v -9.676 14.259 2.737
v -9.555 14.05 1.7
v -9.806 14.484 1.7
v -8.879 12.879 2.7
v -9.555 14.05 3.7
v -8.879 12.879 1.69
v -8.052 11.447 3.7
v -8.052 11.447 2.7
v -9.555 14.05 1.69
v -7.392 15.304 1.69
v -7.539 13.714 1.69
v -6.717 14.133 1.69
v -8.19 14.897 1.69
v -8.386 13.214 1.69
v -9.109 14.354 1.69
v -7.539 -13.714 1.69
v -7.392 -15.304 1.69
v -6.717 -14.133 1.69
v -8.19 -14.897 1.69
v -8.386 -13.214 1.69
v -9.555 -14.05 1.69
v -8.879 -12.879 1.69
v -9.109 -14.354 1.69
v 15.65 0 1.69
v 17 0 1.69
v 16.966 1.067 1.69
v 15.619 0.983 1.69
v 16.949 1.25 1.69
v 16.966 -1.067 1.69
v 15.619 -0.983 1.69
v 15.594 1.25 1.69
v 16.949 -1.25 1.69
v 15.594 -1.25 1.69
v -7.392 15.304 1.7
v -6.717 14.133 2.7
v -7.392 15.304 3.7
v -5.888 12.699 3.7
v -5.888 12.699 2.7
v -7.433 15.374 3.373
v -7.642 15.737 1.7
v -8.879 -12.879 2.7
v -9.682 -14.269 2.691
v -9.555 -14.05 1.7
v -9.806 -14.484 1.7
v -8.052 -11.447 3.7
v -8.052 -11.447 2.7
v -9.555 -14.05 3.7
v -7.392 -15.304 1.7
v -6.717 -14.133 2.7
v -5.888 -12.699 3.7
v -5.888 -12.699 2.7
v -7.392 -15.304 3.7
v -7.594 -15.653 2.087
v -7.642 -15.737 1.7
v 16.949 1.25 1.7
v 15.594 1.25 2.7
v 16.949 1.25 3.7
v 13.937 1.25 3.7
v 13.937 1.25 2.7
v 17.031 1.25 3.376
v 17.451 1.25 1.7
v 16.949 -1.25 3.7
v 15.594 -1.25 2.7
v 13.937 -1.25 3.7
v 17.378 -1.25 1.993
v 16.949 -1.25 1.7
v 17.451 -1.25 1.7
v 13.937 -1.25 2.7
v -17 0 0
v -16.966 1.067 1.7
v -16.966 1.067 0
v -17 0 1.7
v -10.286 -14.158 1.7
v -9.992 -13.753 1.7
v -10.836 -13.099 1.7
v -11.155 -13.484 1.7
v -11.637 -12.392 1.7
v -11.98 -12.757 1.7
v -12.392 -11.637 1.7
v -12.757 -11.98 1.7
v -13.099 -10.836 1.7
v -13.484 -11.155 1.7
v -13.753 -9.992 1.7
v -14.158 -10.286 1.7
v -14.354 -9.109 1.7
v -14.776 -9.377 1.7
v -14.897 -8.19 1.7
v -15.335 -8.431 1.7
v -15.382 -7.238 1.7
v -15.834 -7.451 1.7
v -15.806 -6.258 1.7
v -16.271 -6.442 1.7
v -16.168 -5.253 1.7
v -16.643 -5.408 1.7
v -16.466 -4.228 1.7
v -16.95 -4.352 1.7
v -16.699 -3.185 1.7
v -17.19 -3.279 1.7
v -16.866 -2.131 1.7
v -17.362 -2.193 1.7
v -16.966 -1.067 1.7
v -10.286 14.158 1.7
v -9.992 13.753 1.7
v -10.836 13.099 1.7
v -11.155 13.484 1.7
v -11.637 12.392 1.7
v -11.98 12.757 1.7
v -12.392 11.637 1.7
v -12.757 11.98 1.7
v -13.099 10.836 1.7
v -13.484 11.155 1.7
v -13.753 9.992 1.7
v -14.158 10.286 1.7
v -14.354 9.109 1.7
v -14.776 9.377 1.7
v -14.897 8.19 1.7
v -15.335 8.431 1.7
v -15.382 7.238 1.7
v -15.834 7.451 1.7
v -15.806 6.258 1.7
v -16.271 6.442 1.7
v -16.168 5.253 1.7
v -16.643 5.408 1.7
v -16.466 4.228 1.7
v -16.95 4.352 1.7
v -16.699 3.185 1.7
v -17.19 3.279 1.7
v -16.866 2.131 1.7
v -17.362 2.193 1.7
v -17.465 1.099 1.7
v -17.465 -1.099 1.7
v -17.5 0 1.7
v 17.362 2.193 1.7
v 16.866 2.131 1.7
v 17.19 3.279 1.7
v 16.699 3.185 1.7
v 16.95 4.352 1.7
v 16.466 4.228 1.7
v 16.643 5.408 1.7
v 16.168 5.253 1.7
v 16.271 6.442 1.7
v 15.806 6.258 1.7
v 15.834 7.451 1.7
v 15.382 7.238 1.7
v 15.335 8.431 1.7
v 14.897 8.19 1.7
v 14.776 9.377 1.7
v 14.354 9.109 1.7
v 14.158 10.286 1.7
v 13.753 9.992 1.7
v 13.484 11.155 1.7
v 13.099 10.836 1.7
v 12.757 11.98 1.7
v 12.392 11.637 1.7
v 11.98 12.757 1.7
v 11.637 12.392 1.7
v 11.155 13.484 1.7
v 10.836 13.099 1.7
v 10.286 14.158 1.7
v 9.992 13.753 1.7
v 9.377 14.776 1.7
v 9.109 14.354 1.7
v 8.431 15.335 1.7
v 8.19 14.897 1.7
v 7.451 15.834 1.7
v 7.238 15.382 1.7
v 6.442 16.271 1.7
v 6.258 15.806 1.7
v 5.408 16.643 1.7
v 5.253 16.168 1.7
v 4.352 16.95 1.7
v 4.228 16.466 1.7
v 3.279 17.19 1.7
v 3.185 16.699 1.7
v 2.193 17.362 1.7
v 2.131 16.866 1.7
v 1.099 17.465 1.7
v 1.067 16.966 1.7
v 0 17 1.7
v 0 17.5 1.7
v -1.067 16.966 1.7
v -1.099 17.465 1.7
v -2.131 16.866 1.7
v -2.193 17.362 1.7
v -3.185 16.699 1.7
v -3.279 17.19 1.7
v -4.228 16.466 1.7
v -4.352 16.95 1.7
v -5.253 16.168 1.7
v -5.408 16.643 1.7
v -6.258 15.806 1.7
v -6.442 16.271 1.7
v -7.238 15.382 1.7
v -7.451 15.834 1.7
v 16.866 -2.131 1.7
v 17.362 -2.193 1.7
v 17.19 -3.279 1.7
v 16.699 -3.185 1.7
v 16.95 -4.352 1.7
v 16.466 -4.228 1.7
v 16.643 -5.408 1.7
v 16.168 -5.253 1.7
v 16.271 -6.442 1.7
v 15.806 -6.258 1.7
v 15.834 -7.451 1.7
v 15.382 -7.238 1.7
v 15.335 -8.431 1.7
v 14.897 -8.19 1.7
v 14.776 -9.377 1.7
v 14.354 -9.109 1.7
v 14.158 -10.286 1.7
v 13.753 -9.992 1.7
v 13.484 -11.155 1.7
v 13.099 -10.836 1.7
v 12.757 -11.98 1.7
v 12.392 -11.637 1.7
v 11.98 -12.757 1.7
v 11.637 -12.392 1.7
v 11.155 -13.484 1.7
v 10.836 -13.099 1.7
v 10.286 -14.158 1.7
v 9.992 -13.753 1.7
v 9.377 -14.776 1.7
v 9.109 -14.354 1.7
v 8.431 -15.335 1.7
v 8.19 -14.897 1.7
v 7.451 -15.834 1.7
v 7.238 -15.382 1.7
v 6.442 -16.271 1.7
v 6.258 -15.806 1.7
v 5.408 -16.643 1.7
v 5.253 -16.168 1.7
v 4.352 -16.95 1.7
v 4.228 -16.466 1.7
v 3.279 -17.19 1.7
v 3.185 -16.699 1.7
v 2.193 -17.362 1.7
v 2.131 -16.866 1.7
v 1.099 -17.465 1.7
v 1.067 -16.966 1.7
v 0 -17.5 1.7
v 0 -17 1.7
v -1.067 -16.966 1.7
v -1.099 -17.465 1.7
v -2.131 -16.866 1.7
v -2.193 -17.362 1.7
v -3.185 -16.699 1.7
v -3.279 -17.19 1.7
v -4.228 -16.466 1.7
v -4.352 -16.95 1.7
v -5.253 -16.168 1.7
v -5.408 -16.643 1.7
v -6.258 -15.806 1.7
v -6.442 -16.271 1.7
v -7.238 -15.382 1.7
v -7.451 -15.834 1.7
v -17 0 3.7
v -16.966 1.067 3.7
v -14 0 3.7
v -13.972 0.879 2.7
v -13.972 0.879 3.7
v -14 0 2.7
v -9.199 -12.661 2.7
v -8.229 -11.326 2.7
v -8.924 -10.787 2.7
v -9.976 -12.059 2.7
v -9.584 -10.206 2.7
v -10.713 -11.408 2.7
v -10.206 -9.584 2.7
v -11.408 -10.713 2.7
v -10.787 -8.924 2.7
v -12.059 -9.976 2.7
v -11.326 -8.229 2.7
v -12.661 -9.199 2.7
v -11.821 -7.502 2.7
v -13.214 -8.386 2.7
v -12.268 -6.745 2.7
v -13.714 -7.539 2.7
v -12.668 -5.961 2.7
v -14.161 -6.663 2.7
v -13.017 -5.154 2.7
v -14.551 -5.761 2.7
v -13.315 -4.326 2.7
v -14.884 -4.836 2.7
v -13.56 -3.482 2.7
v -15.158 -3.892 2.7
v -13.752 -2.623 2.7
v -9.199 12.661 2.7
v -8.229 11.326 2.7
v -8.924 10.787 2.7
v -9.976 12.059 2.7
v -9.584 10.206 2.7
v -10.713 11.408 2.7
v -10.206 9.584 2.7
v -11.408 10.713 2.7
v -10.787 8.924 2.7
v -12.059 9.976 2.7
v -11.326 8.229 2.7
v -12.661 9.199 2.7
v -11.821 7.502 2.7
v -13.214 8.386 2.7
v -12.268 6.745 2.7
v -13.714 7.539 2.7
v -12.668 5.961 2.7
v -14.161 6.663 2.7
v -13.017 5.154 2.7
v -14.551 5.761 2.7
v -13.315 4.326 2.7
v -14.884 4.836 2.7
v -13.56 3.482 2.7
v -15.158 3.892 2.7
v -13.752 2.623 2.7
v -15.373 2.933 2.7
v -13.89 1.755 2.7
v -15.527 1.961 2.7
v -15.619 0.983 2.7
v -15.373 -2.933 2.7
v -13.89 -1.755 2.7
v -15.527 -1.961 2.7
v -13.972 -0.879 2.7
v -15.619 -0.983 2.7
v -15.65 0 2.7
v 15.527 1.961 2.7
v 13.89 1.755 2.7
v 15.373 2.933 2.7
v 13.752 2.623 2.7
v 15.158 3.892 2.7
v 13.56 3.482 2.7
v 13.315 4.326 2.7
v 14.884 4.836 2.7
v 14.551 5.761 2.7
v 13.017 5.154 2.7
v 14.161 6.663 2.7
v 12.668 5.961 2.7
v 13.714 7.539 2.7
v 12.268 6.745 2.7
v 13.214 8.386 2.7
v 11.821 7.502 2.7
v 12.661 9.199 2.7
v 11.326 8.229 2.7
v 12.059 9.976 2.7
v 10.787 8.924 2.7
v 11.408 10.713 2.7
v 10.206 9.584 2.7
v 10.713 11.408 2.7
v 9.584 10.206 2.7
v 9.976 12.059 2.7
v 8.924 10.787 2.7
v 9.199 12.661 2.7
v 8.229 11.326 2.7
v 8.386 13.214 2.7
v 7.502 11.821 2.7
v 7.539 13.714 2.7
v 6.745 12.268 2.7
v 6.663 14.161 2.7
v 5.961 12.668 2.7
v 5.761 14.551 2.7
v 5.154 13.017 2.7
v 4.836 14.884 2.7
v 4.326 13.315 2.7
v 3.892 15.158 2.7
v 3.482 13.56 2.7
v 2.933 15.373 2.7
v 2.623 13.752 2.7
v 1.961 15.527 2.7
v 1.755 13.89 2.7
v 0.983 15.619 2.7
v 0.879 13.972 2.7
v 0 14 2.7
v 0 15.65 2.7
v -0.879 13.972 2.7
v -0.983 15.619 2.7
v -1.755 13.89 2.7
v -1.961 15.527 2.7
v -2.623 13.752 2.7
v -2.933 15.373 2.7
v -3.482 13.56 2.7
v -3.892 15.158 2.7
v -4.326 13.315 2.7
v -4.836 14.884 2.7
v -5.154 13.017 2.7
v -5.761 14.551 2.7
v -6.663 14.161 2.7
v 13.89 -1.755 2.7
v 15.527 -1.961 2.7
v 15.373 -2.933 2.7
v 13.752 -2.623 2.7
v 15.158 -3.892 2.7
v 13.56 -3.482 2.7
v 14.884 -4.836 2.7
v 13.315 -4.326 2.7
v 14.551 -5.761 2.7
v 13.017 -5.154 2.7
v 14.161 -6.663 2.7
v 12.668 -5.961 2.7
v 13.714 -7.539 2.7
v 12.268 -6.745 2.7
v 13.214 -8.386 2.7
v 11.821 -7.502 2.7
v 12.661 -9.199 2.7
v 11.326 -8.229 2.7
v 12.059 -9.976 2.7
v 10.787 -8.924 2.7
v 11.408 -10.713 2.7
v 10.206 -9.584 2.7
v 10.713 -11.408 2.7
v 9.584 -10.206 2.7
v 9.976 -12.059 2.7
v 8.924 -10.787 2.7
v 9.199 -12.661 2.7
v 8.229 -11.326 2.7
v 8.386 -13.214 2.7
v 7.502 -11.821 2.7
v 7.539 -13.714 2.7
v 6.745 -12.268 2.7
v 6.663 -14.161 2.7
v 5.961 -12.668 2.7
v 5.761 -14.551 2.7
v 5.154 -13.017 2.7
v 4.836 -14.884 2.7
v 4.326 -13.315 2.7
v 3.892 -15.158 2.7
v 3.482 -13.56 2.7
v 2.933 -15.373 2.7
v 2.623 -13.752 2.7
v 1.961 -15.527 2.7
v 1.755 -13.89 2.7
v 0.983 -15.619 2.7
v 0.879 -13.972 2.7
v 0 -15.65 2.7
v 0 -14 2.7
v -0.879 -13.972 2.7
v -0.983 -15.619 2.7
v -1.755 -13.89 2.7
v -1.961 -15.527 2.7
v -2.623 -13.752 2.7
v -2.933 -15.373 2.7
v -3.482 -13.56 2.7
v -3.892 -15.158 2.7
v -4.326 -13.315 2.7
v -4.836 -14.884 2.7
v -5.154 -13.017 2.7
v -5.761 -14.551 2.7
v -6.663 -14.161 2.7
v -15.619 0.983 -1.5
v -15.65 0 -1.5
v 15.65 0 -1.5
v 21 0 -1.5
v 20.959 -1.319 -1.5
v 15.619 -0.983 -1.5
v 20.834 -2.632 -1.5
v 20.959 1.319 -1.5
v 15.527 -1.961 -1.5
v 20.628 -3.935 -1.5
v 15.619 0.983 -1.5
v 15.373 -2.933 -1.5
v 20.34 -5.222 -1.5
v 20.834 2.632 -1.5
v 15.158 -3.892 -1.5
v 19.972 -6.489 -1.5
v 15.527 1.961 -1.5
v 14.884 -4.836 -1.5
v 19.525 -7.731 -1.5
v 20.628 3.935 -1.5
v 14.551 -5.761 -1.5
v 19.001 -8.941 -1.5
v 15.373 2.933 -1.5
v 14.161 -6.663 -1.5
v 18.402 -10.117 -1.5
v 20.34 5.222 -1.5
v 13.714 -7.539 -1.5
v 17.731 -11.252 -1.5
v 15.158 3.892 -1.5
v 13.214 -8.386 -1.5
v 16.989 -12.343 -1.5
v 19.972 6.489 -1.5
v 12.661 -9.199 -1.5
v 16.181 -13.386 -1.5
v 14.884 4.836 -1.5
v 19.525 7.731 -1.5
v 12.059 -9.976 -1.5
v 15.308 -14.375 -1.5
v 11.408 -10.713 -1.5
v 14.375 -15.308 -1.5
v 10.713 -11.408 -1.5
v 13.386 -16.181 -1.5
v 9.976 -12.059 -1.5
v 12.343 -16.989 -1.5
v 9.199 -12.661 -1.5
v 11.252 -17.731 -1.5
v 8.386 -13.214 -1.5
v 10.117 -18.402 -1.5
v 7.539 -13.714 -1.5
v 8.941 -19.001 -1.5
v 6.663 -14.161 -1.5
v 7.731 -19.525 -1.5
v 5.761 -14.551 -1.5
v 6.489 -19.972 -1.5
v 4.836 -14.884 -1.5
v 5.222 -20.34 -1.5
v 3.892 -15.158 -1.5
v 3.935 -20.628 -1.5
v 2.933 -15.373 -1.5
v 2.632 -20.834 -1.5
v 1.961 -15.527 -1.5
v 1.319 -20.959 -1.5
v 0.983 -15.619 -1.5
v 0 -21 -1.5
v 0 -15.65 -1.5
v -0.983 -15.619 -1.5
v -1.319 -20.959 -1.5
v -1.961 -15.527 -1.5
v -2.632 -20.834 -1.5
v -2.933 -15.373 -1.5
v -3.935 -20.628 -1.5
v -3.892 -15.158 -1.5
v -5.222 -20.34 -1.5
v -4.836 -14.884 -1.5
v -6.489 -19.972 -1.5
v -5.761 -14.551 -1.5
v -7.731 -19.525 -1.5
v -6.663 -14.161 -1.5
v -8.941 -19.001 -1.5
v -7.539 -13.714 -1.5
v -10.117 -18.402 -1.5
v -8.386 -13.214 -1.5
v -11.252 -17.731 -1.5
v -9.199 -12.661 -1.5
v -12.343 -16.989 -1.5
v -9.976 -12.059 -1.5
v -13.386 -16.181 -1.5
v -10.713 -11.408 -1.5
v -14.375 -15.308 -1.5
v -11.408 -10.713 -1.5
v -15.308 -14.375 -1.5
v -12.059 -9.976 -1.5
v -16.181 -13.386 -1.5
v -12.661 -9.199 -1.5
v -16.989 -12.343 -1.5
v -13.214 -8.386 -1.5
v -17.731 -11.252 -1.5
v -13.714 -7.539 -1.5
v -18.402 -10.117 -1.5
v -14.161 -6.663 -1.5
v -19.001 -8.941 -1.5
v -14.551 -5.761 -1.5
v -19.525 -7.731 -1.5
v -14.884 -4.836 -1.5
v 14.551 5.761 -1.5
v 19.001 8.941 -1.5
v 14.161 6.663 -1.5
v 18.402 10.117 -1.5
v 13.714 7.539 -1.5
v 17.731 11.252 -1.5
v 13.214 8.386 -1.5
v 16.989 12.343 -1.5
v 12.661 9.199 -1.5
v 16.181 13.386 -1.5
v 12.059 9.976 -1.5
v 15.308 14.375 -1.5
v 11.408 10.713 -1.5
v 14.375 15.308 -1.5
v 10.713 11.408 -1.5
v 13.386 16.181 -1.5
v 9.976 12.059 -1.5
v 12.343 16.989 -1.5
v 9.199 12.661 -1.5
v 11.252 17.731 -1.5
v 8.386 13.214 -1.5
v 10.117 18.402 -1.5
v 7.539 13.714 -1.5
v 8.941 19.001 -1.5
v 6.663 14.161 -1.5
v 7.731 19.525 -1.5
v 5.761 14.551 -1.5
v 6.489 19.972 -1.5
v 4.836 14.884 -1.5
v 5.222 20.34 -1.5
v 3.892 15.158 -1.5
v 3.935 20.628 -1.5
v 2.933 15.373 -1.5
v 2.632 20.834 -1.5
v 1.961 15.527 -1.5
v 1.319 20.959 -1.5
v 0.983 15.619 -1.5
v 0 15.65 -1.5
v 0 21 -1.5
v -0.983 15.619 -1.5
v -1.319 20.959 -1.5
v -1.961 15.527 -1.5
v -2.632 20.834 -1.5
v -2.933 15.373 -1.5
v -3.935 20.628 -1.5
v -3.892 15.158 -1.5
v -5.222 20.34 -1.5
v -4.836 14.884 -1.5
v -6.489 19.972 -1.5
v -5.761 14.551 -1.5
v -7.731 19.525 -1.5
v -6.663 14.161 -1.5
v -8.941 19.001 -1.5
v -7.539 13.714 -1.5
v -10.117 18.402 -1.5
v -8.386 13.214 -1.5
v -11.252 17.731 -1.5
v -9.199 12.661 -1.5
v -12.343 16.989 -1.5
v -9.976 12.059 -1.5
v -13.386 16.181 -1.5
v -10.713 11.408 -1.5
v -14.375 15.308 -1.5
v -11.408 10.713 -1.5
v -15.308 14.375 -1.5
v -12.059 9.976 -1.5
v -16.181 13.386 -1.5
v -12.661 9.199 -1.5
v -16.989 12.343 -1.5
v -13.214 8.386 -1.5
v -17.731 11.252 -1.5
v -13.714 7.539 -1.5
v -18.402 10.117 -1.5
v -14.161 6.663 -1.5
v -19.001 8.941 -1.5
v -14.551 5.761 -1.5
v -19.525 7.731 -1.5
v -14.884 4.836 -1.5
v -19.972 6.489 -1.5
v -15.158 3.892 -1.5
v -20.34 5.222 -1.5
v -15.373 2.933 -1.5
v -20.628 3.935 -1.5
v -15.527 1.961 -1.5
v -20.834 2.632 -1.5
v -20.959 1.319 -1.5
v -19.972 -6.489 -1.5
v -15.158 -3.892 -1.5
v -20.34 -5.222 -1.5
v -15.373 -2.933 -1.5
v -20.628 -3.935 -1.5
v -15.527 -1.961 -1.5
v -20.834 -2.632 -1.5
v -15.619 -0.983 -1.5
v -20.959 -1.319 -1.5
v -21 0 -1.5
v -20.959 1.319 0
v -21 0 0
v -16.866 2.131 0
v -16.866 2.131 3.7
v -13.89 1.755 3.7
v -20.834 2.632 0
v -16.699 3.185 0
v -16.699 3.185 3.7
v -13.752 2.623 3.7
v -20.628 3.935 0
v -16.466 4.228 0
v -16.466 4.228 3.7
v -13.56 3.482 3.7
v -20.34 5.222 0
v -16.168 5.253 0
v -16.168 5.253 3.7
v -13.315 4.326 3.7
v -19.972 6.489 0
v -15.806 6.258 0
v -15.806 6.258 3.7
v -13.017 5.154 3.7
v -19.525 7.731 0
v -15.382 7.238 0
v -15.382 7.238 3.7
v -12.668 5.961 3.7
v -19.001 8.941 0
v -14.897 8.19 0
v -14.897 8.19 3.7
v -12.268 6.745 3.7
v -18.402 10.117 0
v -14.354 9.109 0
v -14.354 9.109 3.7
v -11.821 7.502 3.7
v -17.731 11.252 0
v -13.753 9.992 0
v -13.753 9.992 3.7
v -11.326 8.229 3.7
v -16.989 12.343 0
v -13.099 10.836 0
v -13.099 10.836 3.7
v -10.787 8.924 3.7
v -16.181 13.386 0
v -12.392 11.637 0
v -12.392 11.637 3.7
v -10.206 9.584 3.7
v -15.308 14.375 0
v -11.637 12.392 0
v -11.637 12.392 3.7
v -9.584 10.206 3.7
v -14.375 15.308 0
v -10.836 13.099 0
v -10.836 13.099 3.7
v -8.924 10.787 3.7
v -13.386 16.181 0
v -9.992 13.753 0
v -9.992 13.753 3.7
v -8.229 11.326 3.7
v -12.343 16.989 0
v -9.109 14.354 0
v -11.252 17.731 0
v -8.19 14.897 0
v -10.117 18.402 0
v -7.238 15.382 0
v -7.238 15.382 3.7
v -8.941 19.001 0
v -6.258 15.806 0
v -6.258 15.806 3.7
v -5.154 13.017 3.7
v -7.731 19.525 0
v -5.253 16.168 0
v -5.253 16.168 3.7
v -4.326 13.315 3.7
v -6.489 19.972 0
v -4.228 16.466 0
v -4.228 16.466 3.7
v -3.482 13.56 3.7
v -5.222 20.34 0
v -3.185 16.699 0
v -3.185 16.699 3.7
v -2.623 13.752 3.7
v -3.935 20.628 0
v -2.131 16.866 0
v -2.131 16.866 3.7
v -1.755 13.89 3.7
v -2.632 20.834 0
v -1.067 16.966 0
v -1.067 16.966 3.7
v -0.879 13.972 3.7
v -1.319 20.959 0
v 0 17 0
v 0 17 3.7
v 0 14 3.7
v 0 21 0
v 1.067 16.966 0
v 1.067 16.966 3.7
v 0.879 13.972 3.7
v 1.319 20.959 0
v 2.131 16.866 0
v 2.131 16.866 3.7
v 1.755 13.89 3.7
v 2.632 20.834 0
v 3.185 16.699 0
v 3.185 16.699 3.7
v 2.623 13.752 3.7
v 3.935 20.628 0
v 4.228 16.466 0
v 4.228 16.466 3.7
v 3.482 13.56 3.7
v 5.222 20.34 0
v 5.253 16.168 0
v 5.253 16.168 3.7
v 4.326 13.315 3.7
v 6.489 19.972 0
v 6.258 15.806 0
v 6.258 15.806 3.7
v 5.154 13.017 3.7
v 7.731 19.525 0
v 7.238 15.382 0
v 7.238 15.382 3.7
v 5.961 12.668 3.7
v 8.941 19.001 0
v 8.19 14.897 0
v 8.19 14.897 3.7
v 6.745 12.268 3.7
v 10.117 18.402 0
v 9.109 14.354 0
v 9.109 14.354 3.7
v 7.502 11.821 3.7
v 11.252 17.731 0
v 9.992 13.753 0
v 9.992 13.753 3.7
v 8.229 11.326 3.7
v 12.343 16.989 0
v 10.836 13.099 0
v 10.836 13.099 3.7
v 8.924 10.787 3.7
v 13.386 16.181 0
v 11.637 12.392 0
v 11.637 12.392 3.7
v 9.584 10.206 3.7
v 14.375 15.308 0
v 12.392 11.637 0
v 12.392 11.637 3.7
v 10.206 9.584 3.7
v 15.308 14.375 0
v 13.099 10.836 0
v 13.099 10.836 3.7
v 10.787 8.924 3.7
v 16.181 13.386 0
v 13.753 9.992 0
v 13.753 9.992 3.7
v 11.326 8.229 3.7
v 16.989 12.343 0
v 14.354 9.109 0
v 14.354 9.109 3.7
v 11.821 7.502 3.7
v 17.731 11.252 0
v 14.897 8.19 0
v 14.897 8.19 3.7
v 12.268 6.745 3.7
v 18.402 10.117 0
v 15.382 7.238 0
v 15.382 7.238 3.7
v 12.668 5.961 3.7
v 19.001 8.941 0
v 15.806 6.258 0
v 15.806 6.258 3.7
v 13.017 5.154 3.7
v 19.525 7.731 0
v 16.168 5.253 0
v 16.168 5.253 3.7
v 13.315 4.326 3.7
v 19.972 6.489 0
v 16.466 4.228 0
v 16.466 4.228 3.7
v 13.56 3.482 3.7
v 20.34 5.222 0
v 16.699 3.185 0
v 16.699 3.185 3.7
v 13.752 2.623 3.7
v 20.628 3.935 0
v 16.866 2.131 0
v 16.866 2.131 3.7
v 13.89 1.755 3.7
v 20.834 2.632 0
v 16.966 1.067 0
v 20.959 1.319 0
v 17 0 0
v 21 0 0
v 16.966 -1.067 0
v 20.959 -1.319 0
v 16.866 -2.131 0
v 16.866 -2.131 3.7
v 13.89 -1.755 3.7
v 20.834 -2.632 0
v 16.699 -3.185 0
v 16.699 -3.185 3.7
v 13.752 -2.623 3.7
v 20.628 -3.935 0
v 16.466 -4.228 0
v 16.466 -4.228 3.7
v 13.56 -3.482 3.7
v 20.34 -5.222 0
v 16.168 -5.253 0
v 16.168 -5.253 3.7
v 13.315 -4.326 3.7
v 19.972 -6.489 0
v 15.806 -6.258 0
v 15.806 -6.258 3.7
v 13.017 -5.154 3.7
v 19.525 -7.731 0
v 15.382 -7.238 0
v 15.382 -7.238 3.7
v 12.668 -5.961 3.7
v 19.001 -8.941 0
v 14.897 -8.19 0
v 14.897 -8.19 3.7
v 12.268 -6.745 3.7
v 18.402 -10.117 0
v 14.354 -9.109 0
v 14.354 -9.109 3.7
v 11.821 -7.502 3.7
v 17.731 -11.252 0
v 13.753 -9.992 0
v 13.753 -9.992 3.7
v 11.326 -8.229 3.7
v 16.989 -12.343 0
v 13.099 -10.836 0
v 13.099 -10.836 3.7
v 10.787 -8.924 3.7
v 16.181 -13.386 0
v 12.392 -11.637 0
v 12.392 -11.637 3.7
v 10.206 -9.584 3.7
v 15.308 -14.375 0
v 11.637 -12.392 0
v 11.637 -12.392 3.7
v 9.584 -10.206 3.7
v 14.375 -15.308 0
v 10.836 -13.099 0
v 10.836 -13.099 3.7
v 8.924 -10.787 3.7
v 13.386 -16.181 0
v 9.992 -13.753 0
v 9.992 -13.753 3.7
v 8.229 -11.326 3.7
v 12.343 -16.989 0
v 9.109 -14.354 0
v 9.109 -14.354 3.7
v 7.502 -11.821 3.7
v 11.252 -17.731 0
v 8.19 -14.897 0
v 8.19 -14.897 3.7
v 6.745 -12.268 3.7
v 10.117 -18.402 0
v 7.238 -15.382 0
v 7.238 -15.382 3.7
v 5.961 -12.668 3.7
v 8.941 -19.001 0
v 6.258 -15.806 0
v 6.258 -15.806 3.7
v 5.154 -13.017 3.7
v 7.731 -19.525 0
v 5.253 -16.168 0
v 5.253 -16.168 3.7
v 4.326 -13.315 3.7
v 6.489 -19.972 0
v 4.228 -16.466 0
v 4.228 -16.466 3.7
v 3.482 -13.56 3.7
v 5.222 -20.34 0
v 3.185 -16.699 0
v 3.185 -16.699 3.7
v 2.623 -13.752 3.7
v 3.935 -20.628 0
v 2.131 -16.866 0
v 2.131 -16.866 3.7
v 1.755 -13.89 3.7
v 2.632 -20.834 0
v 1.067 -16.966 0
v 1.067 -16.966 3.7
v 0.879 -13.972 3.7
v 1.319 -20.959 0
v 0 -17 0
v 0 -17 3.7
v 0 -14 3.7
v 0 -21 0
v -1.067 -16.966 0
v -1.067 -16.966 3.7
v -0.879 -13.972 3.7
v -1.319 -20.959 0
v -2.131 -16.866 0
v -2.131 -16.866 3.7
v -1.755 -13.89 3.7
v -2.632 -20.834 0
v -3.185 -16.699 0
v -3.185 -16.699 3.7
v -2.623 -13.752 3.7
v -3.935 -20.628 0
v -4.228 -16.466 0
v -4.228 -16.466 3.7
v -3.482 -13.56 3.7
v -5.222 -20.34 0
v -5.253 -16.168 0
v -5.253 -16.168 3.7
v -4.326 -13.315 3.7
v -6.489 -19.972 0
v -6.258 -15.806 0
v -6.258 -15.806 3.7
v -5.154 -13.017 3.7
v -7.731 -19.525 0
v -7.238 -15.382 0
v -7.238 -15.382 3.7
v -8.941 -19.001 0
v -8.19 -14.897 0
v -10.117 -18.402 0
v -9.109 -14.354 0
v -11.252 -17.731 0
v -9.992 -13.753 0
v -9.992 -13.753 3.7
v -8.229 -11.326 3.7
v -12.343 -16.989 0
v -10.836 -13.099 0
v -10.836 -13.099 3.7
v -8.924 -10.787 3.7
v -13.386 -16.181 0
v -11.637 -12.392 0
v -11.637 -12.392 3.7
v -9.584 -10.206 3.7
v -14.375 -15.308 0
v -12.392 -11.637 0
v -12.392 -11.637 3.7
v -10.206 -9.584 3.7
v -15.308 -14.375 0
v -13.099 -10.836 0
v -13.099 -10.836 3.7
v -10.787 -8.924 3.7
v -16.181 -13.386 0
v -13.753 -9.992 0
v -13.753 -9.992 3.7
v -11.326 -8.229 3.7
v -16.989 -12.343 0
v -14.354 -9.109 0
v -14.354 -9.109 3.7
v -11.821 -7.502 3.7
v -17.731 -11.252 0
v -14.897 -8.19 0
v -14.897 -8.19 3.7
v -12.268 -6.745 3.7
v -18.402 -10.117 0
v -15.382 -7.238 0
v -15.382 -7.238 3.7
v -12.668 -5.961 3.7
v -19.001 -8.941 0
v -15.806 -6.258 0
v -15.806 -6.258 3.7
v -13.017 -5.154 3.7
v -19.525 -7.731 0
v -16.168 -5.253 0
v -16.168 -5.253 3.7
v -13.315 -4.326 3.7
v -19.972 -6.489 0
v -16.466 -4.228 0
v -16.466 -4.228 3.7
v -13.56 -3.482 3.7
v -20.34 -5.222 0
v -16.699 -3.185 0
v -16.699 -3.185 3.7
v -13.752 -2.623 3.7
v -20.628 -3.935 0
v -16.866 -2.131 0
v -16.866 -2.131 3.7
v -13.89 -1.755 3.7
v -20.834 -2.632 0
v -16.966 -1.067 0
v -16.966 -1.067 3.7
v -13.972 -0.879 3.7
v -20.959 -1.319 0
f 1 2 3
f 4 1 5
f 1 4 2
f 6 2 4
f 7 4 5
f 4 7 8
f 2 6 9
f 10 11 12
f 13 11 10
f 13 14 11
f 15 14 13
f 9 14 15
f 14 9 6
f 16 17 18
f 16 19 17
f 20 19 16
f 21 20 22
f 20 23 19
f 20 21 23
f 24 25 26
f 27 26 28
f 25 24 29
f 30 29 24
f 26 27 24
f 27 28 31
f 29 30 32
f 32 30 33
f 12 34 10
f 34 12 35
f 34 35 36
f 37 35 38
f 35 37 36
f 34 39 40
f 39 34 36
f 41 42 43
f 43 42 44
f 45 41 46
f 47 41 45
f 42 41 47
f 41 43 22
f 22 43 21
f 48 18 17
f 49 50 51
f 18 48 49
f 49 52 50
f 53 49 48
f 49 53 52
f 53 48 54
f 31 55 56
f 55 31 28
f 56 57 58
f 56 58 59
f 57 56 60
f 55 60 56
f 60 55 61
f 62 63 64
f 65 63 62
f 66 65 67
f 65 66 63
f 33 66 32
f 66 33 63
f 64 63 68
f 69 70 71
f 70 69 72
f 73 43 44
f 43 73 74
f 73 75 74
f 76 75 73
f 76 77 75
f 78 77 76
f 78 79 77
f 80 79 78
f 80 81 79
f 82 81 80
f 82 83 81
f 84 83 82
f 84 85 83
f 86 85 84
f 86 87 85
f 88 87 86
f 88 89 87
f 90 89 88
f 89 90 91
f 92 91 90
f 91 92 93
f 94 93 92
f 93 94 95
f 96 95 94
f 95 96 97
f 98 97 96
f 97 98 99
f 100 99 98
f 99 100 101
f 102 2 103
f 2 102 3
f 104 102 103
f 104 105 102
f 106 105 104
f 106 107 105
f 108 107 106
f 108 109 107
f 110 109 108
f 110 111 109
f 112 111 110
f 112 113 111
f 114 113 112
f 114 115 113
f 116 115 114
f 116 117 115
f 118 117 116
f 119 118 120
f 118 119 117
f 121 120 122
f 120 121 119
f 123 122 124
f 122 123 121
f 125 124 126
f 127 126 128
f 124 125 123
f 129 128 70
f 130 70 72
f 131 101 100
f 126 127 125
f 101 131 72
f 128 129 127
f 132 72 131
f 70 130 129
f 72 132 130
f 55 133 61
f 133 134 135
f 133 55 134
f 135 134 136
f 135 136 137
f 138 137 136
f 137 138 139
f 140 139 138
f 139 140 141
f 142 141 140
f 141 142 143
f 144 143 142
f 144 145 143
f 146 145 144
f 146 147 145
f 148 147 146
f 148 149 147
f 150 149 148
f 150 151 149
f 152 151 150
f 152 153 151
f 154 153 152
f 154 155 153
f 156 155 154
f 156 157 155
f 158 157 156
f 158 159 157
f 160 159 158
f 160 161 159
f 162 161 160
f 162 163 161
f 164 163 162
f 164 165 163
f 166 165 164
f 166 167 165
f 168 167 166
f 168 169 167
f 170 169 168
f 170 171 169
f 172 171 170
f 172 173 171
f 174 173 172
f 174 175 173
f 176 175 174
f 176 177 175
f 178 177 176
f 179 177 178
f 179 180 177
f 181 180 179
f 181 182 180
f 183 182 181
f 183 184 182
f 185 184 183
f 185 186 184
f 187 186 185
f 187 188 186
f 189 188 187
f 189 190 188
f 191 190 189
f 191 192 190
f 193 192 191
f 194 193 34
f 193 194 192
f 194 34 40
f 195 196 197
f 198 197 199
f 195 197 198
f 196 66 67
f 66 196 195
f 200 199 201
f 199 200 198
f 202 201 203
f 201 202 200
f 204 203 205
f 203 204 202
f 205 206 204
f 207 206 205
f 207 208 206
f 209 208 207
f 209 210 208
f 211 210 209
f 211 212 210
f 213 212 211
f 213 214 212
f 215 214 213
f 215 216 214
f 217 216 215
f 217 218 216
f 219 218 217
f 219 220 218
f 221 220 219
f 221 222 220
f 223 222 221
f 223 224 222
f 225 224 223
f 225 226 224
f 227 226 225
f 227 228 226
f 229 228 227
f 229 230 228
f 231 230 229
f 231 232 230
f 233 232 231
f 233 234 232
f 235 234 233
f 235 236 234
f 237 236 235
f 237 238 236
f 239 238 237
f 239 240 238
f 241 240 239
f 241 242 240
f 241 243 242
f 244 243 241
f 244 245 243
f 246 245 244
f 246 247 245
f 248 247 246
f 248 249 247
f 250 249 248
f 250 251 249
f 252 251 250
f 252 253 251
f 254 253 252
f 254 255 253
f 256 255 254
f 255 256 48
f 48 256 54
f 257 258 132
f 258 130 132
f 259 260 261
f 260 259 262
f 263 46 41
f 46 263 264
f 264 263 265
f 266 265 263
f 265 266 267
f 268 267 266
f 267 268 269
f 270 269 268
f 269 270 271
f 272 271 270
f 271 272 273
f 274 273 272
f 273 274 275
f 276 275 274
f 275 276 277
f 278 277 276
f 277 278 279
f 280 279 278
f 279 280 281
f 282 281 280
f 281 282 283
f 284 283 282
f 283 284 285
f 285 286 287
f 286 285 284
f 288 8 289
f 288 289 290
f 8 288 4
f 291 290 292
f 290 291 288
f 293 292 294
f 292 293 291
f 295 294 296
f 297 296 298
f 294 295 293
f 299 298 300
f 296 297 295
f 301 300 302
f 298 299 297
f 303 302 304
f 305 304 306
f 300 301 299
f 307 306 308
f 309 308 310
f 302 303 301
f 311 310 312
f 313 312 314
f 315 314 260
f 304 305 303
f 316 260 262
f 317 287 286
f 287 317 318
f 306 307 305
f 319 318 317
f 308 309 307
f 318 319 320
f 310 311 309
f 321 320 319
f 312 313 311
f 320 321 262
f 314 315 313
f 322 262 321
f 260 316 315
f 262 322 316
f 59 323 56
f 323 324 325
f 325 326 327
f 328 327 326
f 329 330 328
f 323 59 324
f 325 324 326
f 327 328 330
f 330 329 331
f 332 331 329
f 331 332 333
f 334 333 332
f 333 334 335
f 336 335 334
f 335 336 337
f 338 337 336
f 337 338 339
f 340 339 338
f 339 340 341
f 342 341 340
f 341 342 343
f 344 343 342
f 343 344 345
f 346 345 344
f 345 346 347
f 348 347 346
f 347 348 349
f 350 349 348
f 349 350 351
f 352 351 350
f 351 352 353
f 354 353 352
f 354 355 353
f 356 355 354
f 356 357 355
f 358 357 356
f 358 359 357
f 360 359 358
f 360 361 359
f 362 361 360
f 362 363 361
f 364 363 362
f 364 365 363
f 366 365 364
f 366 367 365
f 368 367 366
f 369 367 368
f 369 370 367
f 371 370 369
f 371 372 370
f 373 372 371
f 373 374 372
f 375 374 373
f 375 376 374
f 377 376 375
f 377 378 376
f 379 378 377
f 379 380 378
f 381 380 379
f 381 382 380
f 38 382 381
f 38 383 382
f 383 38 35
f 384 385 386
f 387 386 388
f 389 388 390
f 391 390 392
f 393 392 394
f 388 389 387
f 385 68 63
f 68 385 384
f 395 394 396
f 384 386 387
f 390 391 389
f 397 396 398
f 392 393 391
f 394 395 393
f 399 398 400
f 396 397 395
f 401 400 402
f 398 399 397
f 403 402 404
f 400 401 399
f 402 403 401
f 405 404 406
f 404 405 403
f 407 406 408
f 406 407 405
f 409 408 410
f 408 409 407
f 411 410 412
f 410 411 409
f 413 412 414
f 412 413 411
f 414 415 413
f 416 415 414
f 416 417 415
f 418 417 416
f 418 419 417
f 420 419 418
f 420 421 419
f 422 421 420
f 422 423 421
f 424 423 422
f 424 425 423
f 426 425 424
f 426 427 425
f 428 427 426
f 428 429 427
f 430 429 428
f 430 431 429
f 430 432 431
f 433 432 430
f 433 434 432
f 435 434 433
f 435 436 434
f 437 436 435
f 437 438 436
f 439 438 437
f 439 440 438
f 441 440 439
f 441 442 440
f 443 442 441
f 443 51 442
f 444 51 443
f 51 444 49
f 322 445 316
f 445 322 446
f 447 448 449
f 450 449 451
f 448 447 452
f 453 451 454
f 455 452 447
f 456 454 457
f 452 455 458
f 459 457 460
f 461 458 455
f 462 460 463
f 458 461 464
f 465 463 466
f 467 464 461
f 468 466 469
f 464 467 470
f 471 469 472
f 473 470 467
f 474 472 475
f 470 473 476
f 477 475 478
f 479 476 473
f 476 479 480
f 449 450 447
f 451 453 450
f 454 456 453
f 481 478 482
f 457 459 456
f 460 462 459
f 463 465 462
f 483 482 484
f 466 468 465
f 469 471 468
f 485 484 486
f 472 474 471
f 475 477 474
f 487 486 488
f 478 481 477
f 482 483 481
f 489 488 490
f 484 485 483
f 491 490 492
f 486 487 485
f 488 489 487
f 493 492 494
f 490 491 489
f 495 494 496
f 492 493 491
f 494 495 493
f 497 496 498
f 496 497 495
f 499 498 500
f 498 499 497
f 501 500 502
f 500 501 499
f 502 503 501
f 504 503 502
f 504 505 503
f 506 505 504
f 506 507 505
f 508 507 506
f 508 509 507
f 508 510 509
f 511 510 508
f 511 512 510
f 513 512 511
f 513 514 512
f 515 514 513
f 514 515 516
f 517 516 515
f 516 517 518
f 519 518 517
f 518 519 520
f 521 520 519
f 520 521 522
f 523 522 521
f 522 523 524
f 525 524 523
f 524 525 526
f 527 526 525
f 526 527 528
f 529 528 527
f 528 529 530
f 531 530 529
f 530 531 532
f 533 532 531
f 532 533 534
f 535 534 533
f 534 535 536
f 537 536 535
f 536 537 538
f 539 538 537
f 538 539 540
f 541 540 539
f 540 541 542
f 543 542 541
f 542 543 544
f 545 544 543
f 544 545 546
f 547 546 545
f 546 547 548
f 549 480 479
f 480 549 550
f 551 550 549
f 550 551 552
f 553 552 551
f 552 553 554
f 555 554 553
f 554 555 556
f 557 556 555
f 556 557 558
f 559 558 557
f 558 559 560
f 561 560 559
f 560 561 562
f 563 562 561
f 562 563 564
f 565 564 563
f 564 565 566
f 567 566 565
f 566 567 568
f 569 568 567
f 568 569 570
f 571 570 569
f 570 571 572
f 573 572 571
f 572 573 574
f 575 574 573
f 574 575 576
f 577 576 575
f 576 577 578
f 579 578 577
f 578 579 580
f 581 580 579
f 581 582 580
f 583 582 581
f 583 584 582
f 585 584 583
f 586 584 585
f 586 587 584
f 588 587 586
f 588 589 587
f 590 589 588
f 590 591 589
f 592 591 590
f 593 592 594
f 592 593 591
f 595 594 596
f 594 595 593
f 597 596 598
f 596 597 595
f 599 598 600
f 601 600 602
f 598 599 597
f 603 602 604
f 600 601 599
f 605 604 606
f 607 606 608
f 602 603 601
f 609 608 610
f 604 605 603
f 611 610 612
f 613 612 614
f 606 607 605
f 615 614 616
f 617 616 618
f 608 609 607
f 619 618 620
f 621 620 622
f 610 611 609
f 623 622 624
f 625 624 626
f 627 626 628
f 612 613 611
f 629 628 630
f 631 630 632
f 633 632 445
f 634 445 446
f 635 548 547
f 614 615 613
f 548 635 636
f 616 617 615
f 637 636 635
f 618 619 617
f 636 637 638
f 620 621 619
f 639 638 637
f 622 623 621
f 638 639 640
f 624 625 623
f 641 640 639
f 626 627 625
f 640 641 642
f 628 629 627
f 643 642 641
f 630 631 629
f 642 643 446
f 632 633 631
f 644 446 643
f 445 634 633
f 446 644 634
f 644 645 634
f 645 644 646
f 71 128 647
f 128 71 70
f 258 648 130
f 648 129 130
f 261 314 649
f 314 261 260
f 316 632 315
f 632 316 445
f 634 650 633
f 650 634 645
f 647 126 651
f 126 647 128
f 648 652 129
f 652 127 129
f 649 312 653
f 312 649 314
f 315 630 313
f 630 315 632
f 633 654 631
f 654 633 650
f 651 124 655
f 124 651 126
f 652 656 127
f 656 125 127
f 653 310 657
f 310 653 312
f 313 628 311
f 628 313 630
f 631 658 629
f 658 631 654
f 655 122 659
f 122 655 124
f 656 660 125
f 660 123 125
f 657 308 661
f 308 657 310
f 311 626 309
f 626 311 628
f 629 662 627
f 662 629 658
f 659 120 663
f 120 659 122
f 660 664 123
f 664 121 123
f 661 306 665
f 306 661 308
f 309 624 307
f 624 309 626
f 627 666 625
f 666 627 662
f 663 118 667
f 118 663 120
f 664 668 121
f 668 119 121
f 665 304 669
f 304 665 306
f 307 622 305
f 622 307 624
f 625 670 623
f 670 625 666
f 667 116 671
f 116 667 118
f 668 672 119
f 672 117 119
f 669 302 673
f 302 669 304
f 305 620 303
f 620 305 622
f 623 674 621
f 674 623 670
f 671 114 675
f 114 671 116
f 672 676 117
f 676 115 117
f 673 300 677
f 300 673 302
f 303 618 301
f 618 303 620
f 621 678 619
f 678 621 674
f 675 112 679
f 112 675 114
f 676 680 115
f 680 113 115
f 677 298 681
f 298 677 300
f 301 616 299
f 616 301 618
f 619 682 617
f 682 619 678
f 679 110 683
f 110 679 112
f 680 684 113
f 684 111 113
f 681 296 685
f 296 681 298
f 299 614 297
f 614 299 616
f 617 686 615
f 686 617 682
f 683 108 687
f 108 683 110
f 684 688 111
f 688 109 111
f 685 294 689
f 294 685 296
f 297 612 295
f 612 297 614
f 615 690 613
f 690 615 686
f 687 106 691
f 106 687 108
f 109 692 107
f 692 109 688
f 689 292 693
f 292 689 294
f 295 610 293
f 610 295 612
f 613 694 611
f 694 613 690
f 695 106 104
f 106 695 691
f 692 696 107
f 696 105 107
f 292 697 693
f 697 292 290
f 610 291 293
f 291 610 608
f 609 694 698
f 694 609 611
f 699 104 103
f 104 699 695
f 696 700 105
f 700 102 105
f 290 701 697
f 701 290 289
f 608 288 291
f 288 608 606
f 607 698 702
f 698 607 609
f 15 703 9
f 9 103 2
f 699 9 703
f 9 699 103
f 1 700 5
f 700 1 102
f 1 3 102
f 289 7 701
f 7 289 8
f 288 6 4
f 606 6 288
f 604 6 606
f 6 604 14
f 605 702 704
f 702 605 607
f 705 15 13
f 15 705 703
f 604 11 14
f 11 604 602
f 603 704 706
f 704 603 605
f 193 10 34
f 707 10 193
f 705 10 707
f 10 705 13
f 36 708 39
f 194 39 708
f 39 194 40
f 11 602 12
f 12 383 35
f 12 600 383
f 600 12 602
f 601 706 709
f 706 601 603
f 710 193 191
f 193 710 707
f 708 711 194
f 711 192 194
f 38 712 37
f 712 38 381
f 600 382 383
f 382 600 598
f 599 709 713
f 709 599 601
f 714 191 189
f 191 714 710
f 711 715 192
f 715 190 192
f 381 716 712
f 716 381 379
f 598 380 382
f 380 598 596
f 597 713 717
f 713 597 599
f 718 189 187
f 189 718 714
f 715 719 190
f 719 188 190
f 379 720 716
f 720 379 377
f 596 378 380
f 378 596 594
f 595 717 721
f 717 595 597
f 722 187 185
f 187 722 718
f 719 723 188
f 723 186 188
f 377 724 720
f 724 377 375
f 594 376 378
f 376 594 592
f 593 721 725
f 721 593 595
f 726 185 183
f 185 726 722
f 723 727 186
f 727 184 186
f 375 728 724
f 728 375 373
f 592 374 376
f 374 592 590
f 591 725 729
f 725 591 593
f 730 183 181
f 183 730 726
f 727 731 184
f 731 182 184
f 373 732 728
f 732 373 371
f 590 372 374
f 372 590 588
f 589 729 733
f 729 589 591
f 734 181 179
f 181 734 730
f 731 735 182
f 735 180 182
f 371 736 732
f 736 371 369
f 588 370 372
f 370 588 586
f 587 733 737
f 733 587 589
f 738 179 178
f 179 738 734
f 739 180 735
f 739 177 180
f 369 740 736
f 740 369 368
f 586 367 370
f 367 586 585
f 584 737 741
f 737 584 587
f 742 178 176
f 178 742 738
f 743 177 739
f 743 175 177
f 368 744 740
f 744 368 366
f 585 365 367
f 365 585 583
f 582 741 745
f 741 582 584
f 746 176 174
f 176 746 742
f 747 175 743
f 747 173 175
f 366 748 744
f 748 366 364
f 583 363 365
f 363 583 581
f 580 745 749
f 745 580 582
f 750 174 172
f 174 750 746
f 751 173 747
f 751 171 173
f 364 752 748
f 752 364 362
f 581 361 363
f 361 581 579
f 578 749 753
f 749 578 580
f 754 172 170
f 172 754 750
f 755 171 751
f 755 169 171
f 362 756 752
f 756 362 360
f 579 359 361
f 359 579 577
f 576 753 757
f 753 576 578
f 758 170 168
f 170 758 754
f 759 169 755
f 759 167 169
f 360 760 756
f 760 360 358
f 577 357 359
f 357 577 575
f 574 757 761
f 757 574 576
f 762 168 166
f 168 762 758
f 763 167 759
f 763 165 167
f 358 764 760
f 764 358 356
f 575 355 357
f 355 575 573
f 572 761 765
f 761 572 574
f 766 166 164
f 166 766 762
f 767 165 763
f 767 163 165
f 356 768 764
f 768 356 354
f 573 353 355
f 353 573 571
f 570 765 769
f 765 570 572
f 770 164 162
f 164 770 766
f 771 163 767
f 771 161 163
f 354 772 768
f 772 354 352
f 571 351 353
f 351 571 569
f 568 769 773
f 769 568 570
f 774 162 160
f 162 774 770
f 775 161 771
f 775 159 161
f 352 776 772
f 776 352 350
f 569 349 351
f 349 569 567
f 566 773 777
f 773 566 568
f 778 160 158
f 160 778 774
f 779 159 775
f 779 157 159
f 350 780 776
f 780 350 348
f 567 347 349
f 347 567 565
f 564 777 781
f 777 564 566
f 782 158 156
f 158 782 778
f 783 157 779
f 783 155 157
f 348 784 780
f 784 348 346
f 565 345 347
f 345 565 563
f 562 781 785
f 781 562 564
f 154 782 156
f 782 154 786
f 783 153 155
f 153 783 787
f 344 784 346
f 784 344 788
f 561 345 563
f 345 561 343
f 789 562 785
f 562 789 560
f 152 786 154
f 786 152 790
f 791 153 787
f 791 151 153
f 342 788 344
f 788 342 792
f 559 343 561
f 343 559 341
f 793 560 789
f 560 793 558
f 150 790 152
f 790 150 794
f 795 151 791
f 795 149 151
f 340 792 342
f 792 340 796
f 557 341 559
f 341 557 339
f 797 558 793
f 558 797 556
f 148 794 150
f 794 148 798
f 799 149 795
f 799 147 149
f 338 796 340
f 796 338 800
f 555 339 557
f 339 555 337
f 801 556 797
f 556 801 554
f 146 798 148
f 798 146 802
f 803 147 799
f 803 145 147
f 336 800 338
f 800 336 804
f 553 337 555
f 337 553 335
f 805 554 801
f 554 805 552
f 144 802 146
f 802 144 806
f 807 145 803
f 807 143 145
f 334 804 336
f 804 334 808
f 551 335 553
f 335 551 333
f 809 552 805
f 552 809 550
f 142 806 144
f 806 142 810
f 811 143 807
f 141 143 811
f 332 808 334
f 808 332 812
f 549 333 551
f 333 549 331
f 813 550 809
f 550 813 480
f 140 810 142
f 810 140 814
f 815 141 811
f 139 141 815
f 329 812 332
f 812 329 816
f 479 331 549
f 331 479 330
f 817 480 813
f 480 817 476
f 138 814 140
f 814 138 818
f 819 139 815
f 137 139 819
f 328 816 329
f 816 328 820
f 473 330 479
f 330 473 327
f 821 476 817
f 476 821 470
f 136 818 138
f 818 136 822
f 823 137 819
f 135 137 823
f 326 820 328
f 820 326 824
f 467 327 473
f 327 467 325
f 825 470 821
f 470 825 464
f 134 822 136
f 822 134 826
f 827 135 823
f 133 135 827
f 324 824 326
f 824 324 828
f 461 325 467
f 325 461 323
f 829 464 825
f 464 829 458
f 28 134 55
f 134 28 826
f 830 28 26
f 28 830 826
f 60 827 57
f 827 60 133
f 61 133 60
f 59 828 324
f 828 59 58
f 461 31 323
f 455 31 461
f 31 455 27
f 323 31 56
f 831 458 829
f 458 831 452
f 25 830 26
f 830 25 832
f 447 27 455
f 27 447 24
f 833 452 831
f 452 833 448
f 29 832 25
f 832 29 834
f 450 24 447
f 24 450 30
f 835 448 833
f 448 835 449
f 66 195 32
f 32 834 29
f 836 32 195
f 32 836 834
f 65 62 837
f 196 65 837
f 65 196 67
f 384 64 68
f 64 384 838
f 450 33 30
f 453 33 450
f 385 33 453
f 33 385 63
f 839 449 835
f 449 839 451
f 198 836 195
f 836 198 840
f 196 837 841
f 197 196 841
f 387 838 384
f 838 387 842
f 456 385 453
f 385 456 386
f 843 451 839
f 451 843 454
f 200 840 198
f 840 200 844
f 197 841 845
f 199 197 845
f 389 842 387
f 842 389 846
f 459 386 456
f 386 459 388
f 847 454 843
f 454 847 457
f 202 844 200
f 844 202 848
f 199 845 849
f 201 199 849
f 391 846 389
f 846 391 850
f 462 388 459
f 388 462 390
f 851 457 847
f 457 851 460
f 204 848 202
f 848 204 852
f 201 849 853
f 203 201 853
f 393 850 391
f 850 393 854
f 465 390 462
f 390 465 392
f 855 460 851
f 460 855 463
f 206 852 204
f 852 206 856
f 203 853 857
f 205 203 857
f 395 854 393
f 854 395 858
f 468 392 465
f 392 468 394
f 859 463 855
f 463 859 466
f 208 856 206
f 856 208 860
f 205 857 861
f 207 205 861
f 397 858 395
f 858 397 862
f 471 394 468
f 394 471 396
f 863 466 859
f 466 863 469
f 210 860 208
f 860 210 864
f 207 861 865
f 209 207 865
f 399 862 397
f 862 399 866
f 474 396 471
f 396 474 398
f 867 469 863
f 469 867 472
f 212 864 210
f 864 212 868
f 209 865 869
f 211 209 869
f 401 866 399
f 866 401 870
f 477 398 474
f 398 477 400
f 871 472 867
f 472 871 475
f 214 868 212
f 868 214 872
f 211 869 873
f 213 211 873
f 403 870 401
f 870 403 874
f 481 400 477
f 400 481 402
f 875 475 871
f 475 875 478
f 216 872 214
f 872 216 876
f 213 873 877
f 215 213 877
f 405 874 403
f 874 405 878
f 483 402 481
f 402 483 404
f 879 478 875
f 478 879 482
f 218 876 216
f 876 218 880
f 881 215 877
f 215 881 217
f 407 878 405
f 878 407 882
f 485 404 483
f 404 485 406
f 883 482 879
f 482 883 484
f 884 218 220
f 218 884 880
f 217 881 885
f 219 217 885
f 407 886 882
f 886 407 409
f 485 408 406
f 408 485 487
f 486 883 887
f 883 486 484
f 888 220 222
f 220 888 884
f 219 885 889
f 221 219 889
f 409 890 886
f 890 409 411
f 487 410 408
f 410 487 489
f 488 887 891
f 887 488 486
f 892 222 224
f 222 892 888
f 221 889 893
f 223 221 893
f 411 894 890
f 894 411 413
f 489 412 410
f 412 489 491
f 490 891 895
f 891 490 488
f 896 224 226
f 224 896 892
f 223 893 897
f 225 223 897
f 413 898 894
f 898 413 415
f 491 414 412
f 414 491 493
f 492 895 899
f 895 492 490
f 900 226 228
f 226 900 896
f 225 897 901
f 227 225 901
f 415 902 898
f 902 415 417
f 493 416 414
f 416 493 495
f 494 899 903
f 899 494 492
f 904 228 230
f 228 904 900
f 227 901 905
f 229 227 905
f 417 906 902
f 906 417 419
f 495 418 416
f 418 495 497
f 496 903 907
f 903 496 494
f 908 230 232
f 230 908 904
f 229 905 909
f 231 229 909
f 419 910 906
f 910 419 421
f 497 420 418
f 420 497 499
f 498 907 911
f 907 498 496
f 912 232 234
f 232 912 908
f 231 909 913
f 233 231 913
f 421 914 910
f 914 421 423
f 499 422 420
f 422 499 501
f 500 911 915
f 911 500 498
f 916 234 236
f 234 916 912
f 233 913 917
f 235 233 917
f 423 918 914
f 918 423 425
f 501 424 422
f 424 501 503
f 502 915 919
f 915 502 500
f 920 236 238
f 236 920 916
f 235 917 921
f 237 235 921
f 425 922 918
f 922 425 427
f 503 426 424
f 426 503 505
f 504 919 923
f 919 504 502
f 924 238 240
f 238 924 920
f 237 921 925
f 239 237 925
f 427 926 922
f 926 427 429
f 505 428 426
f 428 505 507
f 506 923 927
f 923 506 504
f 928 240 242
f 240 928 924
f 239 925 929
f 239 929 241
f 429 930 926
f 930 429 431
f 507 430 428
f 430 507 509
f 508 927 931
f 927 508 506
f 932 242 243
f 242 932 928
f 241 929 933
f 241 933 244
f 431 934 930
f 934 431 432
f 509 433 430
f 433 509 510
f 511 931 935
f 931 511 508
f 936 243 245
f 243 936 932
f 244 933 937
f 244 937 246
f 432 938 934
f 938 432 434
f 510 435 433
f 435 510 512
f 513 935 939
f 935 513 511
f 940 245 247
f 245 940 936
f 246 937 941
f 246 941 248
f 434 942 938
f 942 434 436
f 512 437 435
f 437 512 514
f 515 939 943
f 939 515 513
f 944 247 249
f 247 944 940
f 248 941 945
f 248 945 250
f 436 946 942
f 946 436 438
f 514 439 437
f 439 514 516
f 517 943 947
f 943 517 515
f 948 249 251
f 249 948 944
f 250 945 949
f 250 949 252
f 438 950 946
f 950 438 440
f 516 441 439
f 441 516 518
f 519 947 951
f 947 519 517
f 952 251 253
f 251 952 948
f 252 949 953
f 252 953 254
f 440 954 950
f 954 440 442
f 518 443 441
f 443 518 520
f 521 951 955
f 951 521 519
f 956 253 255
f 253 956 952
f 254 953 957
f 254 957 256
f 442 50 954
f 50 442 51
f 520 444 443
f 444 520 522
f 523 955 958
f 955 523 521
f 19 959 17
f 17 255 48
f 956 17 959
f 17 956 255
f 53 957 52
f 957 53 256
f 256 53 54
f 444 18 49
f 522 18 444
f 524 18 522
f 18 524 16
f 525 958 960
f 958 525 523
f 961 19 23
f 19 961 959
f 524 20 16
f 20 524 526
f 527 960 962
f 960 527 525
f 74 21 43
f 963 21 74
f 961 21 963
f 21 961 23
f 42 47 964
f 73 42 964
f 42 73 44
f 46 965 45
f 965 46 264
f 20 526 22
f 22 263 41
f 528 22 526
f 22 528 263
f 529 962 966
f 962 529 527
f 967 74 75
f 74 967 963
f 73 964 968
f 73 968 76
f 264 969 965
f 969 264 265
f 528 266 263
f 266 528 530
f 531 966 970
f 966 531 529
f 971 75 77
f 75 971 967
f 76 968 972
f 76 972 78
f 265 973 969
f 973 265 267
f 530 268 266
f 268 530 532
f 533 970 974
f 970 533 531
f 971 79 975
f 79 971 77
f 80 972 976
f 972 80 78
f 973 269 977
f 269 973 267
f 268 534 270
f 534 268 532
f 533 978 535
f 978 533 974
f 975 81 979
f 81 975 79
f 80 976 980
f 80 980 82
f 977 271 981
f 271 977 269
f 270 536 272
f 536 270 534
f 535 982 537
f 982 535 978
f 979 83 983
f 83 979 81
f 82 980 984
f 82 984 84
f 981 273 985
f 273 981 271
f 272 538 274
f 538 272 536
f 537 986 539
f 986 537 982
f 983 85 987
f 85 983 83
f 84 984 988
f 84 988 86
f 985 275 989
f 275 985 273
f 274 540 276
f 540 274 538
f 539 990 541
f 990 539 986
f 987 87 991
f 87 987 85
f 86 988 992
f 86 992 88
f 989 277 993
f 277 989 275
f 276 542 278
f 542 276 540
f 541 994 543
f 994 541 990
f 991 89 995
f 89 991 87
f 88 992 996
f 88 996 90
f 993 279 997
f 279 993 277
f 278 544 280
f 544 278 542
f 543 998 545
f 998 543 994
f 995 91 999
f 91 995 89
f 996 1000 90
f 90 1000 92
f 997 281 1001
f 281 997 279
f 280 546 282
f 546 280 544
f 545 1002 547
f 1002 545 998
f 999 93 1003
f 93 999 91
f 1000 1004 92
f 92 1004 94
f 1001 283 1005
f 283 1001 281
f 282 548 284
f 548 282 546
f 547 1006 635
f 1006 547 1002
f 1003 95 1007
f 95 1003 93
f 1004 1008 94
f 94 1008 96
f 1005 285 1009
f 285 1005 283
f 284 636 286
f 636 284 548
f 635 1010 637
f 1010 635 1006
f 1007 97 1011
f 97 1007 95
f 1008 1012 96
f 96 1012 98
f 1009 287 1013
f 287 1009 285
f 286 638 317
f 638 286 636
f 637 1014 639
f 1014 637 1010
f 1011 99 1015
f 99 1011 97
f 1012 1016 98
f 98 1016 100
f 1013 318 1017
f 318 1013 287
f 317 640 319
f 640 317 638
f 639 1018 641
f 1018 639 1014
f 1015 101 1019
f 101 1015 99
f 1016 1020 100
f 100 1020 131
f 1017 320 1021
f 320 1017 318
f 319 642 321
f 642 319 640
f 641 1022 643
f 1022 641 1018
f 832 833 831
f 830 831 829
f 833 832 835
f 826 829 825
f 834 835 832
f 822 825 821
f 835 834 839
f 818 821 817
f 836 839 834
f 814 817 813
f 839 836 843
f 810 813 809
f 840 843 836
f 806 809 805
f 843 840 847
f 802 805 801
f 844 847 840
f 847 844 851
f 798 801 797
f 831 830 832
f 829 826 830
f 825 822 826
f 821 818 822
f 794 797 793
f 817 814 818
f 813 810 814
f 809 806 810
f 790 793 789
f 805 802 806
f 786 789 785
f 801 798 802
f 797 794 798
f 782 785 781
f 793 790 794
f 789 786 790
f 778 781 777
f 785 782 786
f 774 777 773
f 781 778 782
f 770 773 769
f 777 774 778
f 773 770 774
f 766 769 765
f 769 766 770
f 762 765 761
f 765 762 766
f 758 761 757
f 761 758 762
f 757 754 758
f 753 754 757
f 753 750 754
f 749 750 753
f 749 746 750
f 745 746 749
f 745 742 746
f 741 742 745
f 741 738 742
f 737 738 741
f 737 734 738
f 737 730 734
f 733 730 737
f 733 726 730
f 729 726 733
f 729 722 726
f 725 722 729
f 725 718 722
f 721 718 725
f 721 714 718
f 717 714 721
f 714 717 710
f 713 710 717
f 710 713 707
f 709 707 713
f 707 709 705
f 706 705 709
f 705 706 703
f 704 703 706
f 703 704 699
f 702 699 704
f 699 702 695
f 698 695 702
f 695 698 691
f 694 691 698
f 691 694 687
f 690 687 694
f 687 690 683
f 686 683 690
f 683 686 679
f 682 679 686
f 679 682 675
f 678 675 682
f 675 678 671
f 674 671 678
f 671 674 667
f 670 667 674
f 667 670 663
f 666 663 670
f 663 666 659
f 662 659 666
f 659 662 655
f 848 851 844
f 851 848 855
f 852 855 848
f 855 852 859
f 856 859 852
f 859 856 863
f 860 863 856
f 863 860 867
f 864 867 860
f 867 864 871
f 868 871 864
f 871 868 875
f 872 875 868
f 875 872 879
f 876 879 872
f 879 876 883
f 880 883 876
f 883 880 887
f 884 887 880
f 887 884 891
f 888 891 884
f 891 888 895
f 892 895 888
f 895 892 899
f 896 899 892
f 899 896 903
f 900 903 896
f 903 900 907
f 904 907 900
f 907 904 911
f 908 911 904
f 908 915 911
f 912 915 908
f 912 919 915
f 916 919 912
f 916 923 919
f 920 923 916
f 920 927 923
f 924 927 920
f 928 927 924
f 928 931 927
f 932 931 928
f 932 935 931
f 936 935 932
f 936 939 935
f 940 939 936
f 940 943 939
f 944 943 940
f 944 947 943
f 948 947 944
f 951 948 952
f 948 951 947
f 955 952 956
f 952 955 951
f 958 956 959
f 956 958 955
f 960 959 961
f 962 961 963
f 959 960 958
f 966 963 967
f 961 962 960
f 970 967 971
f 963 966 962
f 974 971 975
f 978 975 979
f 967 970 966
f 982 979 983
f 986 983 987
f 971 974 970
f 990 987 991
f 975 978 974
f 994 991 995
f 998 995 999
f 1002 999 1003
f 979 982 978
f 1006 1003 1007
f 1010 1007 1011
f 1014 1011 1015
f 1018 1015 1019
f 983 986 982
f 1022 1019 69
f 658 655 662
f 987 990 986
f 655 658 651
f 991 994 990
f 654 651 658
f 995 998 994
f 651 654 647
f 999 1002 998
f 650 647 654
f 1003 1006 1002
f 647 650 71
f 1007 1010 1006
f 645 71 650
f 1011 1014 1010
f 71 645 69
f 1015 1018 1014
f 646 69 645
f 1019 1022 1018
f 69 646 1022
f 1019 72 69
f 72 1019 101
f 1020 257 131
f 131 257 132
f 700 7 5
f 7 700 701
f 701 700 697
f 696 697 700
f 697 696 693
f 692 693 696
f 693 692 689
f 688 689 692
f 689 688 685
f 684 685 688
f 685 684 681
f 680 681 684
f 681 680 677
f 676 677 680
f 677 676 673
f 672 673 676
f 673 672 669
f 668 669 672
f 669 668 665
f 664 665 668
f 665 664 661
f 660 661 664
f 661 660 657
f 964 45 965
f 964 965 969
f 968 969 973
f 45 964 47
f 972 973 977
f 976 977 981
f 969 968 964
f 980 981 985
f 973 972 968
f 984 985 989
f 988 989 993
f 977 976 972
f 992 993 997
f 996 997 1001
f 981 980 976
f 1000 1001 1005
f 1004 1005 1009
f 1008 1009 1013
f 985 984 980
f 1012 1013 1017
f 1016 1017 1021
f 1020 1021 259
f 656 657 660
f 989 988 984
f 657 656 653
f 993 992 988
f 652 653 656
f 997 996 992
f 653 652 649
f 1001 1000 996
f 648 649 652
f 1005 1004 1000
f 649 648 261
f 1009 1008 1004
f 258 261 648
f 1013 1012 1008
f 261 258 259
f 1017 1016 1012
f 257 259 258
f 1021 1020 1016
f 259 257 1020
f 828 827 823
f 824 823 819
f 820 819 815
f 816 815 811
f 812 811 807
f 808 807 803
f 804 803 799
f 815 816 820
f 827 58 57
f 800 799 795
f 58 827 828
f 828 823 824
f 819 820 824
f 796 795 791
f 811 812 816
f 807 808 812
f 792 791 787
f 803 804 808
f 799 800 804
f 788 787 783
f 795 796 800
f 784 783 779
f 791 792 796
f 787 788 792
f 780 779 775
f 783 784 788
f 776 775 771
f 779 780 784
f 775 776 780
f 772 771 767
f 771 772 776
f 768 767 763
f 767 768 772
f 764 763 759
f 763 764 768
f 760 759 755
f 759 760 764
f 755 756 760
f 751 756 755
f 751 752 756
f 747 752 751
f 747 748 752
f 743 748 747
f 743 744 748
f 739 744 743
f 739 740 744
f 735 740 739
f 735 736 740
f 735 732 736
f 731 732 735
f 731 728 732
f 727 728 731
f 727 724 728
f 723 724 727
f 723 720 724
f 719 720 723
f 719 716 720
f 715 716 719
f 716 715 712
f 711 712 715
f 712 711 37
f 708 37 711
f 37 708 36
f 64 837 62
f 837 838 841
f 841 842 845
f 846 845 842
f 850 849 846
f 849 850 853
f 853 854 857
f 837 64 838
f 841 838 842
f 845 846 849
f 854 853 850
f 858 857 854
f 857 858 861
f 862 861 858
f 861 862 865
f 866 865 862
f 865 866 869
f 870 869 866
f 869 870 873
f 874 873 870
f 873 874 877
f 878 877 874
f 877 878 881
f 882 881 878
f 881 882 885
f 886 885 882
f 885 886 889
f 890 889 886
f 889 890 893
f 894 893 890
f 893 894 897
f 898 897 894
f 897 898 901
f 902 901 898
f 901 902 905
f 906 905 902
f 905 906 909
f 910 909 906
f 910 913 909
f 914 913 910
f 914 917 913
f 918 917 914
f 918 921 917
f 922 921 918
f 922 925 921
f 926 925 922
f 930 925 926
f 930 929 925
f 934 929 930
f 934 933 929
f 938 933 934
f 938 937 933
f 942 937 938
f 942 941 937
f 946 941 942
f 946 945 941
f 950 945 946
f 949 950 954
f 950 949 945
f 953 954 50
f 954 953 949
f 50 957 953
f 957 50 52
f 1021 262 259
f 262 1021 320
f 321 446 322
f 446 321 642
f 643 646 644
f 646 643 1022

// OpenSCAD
bottom_h = 2;
bottom_w = 0.5;
opening_d = 34;
top_w = 4;
top_h = 1.5;
neck_h = 1.7;
bottle_neck_d = 28;
bottle_cap_d = 31.3;
bottle_cap_rise = 1;
fix = 0.01;
cut_w = 2.5;
cuts = 3;

difference () {
    rotate_extrude($fn=100) polygon([
        [bottle_cap_d/2, -top_h],
        [opening_d/2+top_w, -top_h],
        [opening_d/2+top_w, 0],
        [opening_d/2, 0],
        [opening_d/2, neck_h],
        [opening_d/2+bottom_w, neck_h],
        [opening_d/2, neck_h+bottom_h],
        [bottle_neck_d/2, neck_h+bottom_h],
        [bottle_neck_d/2, neck_h+bottom_h-bottle_cap_rise],
        [bottle_cap_d/2, neck_h+bottom_h-bottle_cap_rise]
    ]);
    
    // Air holes
    for (i = [1:cuts]) rotate([0,0,i*360/cuts]) {
        translate([0,-cut_w/2,neck_h-fix])  {
            cube([opening_d,cut_w,bottom_h+2*fix]);
        }
    }
}
